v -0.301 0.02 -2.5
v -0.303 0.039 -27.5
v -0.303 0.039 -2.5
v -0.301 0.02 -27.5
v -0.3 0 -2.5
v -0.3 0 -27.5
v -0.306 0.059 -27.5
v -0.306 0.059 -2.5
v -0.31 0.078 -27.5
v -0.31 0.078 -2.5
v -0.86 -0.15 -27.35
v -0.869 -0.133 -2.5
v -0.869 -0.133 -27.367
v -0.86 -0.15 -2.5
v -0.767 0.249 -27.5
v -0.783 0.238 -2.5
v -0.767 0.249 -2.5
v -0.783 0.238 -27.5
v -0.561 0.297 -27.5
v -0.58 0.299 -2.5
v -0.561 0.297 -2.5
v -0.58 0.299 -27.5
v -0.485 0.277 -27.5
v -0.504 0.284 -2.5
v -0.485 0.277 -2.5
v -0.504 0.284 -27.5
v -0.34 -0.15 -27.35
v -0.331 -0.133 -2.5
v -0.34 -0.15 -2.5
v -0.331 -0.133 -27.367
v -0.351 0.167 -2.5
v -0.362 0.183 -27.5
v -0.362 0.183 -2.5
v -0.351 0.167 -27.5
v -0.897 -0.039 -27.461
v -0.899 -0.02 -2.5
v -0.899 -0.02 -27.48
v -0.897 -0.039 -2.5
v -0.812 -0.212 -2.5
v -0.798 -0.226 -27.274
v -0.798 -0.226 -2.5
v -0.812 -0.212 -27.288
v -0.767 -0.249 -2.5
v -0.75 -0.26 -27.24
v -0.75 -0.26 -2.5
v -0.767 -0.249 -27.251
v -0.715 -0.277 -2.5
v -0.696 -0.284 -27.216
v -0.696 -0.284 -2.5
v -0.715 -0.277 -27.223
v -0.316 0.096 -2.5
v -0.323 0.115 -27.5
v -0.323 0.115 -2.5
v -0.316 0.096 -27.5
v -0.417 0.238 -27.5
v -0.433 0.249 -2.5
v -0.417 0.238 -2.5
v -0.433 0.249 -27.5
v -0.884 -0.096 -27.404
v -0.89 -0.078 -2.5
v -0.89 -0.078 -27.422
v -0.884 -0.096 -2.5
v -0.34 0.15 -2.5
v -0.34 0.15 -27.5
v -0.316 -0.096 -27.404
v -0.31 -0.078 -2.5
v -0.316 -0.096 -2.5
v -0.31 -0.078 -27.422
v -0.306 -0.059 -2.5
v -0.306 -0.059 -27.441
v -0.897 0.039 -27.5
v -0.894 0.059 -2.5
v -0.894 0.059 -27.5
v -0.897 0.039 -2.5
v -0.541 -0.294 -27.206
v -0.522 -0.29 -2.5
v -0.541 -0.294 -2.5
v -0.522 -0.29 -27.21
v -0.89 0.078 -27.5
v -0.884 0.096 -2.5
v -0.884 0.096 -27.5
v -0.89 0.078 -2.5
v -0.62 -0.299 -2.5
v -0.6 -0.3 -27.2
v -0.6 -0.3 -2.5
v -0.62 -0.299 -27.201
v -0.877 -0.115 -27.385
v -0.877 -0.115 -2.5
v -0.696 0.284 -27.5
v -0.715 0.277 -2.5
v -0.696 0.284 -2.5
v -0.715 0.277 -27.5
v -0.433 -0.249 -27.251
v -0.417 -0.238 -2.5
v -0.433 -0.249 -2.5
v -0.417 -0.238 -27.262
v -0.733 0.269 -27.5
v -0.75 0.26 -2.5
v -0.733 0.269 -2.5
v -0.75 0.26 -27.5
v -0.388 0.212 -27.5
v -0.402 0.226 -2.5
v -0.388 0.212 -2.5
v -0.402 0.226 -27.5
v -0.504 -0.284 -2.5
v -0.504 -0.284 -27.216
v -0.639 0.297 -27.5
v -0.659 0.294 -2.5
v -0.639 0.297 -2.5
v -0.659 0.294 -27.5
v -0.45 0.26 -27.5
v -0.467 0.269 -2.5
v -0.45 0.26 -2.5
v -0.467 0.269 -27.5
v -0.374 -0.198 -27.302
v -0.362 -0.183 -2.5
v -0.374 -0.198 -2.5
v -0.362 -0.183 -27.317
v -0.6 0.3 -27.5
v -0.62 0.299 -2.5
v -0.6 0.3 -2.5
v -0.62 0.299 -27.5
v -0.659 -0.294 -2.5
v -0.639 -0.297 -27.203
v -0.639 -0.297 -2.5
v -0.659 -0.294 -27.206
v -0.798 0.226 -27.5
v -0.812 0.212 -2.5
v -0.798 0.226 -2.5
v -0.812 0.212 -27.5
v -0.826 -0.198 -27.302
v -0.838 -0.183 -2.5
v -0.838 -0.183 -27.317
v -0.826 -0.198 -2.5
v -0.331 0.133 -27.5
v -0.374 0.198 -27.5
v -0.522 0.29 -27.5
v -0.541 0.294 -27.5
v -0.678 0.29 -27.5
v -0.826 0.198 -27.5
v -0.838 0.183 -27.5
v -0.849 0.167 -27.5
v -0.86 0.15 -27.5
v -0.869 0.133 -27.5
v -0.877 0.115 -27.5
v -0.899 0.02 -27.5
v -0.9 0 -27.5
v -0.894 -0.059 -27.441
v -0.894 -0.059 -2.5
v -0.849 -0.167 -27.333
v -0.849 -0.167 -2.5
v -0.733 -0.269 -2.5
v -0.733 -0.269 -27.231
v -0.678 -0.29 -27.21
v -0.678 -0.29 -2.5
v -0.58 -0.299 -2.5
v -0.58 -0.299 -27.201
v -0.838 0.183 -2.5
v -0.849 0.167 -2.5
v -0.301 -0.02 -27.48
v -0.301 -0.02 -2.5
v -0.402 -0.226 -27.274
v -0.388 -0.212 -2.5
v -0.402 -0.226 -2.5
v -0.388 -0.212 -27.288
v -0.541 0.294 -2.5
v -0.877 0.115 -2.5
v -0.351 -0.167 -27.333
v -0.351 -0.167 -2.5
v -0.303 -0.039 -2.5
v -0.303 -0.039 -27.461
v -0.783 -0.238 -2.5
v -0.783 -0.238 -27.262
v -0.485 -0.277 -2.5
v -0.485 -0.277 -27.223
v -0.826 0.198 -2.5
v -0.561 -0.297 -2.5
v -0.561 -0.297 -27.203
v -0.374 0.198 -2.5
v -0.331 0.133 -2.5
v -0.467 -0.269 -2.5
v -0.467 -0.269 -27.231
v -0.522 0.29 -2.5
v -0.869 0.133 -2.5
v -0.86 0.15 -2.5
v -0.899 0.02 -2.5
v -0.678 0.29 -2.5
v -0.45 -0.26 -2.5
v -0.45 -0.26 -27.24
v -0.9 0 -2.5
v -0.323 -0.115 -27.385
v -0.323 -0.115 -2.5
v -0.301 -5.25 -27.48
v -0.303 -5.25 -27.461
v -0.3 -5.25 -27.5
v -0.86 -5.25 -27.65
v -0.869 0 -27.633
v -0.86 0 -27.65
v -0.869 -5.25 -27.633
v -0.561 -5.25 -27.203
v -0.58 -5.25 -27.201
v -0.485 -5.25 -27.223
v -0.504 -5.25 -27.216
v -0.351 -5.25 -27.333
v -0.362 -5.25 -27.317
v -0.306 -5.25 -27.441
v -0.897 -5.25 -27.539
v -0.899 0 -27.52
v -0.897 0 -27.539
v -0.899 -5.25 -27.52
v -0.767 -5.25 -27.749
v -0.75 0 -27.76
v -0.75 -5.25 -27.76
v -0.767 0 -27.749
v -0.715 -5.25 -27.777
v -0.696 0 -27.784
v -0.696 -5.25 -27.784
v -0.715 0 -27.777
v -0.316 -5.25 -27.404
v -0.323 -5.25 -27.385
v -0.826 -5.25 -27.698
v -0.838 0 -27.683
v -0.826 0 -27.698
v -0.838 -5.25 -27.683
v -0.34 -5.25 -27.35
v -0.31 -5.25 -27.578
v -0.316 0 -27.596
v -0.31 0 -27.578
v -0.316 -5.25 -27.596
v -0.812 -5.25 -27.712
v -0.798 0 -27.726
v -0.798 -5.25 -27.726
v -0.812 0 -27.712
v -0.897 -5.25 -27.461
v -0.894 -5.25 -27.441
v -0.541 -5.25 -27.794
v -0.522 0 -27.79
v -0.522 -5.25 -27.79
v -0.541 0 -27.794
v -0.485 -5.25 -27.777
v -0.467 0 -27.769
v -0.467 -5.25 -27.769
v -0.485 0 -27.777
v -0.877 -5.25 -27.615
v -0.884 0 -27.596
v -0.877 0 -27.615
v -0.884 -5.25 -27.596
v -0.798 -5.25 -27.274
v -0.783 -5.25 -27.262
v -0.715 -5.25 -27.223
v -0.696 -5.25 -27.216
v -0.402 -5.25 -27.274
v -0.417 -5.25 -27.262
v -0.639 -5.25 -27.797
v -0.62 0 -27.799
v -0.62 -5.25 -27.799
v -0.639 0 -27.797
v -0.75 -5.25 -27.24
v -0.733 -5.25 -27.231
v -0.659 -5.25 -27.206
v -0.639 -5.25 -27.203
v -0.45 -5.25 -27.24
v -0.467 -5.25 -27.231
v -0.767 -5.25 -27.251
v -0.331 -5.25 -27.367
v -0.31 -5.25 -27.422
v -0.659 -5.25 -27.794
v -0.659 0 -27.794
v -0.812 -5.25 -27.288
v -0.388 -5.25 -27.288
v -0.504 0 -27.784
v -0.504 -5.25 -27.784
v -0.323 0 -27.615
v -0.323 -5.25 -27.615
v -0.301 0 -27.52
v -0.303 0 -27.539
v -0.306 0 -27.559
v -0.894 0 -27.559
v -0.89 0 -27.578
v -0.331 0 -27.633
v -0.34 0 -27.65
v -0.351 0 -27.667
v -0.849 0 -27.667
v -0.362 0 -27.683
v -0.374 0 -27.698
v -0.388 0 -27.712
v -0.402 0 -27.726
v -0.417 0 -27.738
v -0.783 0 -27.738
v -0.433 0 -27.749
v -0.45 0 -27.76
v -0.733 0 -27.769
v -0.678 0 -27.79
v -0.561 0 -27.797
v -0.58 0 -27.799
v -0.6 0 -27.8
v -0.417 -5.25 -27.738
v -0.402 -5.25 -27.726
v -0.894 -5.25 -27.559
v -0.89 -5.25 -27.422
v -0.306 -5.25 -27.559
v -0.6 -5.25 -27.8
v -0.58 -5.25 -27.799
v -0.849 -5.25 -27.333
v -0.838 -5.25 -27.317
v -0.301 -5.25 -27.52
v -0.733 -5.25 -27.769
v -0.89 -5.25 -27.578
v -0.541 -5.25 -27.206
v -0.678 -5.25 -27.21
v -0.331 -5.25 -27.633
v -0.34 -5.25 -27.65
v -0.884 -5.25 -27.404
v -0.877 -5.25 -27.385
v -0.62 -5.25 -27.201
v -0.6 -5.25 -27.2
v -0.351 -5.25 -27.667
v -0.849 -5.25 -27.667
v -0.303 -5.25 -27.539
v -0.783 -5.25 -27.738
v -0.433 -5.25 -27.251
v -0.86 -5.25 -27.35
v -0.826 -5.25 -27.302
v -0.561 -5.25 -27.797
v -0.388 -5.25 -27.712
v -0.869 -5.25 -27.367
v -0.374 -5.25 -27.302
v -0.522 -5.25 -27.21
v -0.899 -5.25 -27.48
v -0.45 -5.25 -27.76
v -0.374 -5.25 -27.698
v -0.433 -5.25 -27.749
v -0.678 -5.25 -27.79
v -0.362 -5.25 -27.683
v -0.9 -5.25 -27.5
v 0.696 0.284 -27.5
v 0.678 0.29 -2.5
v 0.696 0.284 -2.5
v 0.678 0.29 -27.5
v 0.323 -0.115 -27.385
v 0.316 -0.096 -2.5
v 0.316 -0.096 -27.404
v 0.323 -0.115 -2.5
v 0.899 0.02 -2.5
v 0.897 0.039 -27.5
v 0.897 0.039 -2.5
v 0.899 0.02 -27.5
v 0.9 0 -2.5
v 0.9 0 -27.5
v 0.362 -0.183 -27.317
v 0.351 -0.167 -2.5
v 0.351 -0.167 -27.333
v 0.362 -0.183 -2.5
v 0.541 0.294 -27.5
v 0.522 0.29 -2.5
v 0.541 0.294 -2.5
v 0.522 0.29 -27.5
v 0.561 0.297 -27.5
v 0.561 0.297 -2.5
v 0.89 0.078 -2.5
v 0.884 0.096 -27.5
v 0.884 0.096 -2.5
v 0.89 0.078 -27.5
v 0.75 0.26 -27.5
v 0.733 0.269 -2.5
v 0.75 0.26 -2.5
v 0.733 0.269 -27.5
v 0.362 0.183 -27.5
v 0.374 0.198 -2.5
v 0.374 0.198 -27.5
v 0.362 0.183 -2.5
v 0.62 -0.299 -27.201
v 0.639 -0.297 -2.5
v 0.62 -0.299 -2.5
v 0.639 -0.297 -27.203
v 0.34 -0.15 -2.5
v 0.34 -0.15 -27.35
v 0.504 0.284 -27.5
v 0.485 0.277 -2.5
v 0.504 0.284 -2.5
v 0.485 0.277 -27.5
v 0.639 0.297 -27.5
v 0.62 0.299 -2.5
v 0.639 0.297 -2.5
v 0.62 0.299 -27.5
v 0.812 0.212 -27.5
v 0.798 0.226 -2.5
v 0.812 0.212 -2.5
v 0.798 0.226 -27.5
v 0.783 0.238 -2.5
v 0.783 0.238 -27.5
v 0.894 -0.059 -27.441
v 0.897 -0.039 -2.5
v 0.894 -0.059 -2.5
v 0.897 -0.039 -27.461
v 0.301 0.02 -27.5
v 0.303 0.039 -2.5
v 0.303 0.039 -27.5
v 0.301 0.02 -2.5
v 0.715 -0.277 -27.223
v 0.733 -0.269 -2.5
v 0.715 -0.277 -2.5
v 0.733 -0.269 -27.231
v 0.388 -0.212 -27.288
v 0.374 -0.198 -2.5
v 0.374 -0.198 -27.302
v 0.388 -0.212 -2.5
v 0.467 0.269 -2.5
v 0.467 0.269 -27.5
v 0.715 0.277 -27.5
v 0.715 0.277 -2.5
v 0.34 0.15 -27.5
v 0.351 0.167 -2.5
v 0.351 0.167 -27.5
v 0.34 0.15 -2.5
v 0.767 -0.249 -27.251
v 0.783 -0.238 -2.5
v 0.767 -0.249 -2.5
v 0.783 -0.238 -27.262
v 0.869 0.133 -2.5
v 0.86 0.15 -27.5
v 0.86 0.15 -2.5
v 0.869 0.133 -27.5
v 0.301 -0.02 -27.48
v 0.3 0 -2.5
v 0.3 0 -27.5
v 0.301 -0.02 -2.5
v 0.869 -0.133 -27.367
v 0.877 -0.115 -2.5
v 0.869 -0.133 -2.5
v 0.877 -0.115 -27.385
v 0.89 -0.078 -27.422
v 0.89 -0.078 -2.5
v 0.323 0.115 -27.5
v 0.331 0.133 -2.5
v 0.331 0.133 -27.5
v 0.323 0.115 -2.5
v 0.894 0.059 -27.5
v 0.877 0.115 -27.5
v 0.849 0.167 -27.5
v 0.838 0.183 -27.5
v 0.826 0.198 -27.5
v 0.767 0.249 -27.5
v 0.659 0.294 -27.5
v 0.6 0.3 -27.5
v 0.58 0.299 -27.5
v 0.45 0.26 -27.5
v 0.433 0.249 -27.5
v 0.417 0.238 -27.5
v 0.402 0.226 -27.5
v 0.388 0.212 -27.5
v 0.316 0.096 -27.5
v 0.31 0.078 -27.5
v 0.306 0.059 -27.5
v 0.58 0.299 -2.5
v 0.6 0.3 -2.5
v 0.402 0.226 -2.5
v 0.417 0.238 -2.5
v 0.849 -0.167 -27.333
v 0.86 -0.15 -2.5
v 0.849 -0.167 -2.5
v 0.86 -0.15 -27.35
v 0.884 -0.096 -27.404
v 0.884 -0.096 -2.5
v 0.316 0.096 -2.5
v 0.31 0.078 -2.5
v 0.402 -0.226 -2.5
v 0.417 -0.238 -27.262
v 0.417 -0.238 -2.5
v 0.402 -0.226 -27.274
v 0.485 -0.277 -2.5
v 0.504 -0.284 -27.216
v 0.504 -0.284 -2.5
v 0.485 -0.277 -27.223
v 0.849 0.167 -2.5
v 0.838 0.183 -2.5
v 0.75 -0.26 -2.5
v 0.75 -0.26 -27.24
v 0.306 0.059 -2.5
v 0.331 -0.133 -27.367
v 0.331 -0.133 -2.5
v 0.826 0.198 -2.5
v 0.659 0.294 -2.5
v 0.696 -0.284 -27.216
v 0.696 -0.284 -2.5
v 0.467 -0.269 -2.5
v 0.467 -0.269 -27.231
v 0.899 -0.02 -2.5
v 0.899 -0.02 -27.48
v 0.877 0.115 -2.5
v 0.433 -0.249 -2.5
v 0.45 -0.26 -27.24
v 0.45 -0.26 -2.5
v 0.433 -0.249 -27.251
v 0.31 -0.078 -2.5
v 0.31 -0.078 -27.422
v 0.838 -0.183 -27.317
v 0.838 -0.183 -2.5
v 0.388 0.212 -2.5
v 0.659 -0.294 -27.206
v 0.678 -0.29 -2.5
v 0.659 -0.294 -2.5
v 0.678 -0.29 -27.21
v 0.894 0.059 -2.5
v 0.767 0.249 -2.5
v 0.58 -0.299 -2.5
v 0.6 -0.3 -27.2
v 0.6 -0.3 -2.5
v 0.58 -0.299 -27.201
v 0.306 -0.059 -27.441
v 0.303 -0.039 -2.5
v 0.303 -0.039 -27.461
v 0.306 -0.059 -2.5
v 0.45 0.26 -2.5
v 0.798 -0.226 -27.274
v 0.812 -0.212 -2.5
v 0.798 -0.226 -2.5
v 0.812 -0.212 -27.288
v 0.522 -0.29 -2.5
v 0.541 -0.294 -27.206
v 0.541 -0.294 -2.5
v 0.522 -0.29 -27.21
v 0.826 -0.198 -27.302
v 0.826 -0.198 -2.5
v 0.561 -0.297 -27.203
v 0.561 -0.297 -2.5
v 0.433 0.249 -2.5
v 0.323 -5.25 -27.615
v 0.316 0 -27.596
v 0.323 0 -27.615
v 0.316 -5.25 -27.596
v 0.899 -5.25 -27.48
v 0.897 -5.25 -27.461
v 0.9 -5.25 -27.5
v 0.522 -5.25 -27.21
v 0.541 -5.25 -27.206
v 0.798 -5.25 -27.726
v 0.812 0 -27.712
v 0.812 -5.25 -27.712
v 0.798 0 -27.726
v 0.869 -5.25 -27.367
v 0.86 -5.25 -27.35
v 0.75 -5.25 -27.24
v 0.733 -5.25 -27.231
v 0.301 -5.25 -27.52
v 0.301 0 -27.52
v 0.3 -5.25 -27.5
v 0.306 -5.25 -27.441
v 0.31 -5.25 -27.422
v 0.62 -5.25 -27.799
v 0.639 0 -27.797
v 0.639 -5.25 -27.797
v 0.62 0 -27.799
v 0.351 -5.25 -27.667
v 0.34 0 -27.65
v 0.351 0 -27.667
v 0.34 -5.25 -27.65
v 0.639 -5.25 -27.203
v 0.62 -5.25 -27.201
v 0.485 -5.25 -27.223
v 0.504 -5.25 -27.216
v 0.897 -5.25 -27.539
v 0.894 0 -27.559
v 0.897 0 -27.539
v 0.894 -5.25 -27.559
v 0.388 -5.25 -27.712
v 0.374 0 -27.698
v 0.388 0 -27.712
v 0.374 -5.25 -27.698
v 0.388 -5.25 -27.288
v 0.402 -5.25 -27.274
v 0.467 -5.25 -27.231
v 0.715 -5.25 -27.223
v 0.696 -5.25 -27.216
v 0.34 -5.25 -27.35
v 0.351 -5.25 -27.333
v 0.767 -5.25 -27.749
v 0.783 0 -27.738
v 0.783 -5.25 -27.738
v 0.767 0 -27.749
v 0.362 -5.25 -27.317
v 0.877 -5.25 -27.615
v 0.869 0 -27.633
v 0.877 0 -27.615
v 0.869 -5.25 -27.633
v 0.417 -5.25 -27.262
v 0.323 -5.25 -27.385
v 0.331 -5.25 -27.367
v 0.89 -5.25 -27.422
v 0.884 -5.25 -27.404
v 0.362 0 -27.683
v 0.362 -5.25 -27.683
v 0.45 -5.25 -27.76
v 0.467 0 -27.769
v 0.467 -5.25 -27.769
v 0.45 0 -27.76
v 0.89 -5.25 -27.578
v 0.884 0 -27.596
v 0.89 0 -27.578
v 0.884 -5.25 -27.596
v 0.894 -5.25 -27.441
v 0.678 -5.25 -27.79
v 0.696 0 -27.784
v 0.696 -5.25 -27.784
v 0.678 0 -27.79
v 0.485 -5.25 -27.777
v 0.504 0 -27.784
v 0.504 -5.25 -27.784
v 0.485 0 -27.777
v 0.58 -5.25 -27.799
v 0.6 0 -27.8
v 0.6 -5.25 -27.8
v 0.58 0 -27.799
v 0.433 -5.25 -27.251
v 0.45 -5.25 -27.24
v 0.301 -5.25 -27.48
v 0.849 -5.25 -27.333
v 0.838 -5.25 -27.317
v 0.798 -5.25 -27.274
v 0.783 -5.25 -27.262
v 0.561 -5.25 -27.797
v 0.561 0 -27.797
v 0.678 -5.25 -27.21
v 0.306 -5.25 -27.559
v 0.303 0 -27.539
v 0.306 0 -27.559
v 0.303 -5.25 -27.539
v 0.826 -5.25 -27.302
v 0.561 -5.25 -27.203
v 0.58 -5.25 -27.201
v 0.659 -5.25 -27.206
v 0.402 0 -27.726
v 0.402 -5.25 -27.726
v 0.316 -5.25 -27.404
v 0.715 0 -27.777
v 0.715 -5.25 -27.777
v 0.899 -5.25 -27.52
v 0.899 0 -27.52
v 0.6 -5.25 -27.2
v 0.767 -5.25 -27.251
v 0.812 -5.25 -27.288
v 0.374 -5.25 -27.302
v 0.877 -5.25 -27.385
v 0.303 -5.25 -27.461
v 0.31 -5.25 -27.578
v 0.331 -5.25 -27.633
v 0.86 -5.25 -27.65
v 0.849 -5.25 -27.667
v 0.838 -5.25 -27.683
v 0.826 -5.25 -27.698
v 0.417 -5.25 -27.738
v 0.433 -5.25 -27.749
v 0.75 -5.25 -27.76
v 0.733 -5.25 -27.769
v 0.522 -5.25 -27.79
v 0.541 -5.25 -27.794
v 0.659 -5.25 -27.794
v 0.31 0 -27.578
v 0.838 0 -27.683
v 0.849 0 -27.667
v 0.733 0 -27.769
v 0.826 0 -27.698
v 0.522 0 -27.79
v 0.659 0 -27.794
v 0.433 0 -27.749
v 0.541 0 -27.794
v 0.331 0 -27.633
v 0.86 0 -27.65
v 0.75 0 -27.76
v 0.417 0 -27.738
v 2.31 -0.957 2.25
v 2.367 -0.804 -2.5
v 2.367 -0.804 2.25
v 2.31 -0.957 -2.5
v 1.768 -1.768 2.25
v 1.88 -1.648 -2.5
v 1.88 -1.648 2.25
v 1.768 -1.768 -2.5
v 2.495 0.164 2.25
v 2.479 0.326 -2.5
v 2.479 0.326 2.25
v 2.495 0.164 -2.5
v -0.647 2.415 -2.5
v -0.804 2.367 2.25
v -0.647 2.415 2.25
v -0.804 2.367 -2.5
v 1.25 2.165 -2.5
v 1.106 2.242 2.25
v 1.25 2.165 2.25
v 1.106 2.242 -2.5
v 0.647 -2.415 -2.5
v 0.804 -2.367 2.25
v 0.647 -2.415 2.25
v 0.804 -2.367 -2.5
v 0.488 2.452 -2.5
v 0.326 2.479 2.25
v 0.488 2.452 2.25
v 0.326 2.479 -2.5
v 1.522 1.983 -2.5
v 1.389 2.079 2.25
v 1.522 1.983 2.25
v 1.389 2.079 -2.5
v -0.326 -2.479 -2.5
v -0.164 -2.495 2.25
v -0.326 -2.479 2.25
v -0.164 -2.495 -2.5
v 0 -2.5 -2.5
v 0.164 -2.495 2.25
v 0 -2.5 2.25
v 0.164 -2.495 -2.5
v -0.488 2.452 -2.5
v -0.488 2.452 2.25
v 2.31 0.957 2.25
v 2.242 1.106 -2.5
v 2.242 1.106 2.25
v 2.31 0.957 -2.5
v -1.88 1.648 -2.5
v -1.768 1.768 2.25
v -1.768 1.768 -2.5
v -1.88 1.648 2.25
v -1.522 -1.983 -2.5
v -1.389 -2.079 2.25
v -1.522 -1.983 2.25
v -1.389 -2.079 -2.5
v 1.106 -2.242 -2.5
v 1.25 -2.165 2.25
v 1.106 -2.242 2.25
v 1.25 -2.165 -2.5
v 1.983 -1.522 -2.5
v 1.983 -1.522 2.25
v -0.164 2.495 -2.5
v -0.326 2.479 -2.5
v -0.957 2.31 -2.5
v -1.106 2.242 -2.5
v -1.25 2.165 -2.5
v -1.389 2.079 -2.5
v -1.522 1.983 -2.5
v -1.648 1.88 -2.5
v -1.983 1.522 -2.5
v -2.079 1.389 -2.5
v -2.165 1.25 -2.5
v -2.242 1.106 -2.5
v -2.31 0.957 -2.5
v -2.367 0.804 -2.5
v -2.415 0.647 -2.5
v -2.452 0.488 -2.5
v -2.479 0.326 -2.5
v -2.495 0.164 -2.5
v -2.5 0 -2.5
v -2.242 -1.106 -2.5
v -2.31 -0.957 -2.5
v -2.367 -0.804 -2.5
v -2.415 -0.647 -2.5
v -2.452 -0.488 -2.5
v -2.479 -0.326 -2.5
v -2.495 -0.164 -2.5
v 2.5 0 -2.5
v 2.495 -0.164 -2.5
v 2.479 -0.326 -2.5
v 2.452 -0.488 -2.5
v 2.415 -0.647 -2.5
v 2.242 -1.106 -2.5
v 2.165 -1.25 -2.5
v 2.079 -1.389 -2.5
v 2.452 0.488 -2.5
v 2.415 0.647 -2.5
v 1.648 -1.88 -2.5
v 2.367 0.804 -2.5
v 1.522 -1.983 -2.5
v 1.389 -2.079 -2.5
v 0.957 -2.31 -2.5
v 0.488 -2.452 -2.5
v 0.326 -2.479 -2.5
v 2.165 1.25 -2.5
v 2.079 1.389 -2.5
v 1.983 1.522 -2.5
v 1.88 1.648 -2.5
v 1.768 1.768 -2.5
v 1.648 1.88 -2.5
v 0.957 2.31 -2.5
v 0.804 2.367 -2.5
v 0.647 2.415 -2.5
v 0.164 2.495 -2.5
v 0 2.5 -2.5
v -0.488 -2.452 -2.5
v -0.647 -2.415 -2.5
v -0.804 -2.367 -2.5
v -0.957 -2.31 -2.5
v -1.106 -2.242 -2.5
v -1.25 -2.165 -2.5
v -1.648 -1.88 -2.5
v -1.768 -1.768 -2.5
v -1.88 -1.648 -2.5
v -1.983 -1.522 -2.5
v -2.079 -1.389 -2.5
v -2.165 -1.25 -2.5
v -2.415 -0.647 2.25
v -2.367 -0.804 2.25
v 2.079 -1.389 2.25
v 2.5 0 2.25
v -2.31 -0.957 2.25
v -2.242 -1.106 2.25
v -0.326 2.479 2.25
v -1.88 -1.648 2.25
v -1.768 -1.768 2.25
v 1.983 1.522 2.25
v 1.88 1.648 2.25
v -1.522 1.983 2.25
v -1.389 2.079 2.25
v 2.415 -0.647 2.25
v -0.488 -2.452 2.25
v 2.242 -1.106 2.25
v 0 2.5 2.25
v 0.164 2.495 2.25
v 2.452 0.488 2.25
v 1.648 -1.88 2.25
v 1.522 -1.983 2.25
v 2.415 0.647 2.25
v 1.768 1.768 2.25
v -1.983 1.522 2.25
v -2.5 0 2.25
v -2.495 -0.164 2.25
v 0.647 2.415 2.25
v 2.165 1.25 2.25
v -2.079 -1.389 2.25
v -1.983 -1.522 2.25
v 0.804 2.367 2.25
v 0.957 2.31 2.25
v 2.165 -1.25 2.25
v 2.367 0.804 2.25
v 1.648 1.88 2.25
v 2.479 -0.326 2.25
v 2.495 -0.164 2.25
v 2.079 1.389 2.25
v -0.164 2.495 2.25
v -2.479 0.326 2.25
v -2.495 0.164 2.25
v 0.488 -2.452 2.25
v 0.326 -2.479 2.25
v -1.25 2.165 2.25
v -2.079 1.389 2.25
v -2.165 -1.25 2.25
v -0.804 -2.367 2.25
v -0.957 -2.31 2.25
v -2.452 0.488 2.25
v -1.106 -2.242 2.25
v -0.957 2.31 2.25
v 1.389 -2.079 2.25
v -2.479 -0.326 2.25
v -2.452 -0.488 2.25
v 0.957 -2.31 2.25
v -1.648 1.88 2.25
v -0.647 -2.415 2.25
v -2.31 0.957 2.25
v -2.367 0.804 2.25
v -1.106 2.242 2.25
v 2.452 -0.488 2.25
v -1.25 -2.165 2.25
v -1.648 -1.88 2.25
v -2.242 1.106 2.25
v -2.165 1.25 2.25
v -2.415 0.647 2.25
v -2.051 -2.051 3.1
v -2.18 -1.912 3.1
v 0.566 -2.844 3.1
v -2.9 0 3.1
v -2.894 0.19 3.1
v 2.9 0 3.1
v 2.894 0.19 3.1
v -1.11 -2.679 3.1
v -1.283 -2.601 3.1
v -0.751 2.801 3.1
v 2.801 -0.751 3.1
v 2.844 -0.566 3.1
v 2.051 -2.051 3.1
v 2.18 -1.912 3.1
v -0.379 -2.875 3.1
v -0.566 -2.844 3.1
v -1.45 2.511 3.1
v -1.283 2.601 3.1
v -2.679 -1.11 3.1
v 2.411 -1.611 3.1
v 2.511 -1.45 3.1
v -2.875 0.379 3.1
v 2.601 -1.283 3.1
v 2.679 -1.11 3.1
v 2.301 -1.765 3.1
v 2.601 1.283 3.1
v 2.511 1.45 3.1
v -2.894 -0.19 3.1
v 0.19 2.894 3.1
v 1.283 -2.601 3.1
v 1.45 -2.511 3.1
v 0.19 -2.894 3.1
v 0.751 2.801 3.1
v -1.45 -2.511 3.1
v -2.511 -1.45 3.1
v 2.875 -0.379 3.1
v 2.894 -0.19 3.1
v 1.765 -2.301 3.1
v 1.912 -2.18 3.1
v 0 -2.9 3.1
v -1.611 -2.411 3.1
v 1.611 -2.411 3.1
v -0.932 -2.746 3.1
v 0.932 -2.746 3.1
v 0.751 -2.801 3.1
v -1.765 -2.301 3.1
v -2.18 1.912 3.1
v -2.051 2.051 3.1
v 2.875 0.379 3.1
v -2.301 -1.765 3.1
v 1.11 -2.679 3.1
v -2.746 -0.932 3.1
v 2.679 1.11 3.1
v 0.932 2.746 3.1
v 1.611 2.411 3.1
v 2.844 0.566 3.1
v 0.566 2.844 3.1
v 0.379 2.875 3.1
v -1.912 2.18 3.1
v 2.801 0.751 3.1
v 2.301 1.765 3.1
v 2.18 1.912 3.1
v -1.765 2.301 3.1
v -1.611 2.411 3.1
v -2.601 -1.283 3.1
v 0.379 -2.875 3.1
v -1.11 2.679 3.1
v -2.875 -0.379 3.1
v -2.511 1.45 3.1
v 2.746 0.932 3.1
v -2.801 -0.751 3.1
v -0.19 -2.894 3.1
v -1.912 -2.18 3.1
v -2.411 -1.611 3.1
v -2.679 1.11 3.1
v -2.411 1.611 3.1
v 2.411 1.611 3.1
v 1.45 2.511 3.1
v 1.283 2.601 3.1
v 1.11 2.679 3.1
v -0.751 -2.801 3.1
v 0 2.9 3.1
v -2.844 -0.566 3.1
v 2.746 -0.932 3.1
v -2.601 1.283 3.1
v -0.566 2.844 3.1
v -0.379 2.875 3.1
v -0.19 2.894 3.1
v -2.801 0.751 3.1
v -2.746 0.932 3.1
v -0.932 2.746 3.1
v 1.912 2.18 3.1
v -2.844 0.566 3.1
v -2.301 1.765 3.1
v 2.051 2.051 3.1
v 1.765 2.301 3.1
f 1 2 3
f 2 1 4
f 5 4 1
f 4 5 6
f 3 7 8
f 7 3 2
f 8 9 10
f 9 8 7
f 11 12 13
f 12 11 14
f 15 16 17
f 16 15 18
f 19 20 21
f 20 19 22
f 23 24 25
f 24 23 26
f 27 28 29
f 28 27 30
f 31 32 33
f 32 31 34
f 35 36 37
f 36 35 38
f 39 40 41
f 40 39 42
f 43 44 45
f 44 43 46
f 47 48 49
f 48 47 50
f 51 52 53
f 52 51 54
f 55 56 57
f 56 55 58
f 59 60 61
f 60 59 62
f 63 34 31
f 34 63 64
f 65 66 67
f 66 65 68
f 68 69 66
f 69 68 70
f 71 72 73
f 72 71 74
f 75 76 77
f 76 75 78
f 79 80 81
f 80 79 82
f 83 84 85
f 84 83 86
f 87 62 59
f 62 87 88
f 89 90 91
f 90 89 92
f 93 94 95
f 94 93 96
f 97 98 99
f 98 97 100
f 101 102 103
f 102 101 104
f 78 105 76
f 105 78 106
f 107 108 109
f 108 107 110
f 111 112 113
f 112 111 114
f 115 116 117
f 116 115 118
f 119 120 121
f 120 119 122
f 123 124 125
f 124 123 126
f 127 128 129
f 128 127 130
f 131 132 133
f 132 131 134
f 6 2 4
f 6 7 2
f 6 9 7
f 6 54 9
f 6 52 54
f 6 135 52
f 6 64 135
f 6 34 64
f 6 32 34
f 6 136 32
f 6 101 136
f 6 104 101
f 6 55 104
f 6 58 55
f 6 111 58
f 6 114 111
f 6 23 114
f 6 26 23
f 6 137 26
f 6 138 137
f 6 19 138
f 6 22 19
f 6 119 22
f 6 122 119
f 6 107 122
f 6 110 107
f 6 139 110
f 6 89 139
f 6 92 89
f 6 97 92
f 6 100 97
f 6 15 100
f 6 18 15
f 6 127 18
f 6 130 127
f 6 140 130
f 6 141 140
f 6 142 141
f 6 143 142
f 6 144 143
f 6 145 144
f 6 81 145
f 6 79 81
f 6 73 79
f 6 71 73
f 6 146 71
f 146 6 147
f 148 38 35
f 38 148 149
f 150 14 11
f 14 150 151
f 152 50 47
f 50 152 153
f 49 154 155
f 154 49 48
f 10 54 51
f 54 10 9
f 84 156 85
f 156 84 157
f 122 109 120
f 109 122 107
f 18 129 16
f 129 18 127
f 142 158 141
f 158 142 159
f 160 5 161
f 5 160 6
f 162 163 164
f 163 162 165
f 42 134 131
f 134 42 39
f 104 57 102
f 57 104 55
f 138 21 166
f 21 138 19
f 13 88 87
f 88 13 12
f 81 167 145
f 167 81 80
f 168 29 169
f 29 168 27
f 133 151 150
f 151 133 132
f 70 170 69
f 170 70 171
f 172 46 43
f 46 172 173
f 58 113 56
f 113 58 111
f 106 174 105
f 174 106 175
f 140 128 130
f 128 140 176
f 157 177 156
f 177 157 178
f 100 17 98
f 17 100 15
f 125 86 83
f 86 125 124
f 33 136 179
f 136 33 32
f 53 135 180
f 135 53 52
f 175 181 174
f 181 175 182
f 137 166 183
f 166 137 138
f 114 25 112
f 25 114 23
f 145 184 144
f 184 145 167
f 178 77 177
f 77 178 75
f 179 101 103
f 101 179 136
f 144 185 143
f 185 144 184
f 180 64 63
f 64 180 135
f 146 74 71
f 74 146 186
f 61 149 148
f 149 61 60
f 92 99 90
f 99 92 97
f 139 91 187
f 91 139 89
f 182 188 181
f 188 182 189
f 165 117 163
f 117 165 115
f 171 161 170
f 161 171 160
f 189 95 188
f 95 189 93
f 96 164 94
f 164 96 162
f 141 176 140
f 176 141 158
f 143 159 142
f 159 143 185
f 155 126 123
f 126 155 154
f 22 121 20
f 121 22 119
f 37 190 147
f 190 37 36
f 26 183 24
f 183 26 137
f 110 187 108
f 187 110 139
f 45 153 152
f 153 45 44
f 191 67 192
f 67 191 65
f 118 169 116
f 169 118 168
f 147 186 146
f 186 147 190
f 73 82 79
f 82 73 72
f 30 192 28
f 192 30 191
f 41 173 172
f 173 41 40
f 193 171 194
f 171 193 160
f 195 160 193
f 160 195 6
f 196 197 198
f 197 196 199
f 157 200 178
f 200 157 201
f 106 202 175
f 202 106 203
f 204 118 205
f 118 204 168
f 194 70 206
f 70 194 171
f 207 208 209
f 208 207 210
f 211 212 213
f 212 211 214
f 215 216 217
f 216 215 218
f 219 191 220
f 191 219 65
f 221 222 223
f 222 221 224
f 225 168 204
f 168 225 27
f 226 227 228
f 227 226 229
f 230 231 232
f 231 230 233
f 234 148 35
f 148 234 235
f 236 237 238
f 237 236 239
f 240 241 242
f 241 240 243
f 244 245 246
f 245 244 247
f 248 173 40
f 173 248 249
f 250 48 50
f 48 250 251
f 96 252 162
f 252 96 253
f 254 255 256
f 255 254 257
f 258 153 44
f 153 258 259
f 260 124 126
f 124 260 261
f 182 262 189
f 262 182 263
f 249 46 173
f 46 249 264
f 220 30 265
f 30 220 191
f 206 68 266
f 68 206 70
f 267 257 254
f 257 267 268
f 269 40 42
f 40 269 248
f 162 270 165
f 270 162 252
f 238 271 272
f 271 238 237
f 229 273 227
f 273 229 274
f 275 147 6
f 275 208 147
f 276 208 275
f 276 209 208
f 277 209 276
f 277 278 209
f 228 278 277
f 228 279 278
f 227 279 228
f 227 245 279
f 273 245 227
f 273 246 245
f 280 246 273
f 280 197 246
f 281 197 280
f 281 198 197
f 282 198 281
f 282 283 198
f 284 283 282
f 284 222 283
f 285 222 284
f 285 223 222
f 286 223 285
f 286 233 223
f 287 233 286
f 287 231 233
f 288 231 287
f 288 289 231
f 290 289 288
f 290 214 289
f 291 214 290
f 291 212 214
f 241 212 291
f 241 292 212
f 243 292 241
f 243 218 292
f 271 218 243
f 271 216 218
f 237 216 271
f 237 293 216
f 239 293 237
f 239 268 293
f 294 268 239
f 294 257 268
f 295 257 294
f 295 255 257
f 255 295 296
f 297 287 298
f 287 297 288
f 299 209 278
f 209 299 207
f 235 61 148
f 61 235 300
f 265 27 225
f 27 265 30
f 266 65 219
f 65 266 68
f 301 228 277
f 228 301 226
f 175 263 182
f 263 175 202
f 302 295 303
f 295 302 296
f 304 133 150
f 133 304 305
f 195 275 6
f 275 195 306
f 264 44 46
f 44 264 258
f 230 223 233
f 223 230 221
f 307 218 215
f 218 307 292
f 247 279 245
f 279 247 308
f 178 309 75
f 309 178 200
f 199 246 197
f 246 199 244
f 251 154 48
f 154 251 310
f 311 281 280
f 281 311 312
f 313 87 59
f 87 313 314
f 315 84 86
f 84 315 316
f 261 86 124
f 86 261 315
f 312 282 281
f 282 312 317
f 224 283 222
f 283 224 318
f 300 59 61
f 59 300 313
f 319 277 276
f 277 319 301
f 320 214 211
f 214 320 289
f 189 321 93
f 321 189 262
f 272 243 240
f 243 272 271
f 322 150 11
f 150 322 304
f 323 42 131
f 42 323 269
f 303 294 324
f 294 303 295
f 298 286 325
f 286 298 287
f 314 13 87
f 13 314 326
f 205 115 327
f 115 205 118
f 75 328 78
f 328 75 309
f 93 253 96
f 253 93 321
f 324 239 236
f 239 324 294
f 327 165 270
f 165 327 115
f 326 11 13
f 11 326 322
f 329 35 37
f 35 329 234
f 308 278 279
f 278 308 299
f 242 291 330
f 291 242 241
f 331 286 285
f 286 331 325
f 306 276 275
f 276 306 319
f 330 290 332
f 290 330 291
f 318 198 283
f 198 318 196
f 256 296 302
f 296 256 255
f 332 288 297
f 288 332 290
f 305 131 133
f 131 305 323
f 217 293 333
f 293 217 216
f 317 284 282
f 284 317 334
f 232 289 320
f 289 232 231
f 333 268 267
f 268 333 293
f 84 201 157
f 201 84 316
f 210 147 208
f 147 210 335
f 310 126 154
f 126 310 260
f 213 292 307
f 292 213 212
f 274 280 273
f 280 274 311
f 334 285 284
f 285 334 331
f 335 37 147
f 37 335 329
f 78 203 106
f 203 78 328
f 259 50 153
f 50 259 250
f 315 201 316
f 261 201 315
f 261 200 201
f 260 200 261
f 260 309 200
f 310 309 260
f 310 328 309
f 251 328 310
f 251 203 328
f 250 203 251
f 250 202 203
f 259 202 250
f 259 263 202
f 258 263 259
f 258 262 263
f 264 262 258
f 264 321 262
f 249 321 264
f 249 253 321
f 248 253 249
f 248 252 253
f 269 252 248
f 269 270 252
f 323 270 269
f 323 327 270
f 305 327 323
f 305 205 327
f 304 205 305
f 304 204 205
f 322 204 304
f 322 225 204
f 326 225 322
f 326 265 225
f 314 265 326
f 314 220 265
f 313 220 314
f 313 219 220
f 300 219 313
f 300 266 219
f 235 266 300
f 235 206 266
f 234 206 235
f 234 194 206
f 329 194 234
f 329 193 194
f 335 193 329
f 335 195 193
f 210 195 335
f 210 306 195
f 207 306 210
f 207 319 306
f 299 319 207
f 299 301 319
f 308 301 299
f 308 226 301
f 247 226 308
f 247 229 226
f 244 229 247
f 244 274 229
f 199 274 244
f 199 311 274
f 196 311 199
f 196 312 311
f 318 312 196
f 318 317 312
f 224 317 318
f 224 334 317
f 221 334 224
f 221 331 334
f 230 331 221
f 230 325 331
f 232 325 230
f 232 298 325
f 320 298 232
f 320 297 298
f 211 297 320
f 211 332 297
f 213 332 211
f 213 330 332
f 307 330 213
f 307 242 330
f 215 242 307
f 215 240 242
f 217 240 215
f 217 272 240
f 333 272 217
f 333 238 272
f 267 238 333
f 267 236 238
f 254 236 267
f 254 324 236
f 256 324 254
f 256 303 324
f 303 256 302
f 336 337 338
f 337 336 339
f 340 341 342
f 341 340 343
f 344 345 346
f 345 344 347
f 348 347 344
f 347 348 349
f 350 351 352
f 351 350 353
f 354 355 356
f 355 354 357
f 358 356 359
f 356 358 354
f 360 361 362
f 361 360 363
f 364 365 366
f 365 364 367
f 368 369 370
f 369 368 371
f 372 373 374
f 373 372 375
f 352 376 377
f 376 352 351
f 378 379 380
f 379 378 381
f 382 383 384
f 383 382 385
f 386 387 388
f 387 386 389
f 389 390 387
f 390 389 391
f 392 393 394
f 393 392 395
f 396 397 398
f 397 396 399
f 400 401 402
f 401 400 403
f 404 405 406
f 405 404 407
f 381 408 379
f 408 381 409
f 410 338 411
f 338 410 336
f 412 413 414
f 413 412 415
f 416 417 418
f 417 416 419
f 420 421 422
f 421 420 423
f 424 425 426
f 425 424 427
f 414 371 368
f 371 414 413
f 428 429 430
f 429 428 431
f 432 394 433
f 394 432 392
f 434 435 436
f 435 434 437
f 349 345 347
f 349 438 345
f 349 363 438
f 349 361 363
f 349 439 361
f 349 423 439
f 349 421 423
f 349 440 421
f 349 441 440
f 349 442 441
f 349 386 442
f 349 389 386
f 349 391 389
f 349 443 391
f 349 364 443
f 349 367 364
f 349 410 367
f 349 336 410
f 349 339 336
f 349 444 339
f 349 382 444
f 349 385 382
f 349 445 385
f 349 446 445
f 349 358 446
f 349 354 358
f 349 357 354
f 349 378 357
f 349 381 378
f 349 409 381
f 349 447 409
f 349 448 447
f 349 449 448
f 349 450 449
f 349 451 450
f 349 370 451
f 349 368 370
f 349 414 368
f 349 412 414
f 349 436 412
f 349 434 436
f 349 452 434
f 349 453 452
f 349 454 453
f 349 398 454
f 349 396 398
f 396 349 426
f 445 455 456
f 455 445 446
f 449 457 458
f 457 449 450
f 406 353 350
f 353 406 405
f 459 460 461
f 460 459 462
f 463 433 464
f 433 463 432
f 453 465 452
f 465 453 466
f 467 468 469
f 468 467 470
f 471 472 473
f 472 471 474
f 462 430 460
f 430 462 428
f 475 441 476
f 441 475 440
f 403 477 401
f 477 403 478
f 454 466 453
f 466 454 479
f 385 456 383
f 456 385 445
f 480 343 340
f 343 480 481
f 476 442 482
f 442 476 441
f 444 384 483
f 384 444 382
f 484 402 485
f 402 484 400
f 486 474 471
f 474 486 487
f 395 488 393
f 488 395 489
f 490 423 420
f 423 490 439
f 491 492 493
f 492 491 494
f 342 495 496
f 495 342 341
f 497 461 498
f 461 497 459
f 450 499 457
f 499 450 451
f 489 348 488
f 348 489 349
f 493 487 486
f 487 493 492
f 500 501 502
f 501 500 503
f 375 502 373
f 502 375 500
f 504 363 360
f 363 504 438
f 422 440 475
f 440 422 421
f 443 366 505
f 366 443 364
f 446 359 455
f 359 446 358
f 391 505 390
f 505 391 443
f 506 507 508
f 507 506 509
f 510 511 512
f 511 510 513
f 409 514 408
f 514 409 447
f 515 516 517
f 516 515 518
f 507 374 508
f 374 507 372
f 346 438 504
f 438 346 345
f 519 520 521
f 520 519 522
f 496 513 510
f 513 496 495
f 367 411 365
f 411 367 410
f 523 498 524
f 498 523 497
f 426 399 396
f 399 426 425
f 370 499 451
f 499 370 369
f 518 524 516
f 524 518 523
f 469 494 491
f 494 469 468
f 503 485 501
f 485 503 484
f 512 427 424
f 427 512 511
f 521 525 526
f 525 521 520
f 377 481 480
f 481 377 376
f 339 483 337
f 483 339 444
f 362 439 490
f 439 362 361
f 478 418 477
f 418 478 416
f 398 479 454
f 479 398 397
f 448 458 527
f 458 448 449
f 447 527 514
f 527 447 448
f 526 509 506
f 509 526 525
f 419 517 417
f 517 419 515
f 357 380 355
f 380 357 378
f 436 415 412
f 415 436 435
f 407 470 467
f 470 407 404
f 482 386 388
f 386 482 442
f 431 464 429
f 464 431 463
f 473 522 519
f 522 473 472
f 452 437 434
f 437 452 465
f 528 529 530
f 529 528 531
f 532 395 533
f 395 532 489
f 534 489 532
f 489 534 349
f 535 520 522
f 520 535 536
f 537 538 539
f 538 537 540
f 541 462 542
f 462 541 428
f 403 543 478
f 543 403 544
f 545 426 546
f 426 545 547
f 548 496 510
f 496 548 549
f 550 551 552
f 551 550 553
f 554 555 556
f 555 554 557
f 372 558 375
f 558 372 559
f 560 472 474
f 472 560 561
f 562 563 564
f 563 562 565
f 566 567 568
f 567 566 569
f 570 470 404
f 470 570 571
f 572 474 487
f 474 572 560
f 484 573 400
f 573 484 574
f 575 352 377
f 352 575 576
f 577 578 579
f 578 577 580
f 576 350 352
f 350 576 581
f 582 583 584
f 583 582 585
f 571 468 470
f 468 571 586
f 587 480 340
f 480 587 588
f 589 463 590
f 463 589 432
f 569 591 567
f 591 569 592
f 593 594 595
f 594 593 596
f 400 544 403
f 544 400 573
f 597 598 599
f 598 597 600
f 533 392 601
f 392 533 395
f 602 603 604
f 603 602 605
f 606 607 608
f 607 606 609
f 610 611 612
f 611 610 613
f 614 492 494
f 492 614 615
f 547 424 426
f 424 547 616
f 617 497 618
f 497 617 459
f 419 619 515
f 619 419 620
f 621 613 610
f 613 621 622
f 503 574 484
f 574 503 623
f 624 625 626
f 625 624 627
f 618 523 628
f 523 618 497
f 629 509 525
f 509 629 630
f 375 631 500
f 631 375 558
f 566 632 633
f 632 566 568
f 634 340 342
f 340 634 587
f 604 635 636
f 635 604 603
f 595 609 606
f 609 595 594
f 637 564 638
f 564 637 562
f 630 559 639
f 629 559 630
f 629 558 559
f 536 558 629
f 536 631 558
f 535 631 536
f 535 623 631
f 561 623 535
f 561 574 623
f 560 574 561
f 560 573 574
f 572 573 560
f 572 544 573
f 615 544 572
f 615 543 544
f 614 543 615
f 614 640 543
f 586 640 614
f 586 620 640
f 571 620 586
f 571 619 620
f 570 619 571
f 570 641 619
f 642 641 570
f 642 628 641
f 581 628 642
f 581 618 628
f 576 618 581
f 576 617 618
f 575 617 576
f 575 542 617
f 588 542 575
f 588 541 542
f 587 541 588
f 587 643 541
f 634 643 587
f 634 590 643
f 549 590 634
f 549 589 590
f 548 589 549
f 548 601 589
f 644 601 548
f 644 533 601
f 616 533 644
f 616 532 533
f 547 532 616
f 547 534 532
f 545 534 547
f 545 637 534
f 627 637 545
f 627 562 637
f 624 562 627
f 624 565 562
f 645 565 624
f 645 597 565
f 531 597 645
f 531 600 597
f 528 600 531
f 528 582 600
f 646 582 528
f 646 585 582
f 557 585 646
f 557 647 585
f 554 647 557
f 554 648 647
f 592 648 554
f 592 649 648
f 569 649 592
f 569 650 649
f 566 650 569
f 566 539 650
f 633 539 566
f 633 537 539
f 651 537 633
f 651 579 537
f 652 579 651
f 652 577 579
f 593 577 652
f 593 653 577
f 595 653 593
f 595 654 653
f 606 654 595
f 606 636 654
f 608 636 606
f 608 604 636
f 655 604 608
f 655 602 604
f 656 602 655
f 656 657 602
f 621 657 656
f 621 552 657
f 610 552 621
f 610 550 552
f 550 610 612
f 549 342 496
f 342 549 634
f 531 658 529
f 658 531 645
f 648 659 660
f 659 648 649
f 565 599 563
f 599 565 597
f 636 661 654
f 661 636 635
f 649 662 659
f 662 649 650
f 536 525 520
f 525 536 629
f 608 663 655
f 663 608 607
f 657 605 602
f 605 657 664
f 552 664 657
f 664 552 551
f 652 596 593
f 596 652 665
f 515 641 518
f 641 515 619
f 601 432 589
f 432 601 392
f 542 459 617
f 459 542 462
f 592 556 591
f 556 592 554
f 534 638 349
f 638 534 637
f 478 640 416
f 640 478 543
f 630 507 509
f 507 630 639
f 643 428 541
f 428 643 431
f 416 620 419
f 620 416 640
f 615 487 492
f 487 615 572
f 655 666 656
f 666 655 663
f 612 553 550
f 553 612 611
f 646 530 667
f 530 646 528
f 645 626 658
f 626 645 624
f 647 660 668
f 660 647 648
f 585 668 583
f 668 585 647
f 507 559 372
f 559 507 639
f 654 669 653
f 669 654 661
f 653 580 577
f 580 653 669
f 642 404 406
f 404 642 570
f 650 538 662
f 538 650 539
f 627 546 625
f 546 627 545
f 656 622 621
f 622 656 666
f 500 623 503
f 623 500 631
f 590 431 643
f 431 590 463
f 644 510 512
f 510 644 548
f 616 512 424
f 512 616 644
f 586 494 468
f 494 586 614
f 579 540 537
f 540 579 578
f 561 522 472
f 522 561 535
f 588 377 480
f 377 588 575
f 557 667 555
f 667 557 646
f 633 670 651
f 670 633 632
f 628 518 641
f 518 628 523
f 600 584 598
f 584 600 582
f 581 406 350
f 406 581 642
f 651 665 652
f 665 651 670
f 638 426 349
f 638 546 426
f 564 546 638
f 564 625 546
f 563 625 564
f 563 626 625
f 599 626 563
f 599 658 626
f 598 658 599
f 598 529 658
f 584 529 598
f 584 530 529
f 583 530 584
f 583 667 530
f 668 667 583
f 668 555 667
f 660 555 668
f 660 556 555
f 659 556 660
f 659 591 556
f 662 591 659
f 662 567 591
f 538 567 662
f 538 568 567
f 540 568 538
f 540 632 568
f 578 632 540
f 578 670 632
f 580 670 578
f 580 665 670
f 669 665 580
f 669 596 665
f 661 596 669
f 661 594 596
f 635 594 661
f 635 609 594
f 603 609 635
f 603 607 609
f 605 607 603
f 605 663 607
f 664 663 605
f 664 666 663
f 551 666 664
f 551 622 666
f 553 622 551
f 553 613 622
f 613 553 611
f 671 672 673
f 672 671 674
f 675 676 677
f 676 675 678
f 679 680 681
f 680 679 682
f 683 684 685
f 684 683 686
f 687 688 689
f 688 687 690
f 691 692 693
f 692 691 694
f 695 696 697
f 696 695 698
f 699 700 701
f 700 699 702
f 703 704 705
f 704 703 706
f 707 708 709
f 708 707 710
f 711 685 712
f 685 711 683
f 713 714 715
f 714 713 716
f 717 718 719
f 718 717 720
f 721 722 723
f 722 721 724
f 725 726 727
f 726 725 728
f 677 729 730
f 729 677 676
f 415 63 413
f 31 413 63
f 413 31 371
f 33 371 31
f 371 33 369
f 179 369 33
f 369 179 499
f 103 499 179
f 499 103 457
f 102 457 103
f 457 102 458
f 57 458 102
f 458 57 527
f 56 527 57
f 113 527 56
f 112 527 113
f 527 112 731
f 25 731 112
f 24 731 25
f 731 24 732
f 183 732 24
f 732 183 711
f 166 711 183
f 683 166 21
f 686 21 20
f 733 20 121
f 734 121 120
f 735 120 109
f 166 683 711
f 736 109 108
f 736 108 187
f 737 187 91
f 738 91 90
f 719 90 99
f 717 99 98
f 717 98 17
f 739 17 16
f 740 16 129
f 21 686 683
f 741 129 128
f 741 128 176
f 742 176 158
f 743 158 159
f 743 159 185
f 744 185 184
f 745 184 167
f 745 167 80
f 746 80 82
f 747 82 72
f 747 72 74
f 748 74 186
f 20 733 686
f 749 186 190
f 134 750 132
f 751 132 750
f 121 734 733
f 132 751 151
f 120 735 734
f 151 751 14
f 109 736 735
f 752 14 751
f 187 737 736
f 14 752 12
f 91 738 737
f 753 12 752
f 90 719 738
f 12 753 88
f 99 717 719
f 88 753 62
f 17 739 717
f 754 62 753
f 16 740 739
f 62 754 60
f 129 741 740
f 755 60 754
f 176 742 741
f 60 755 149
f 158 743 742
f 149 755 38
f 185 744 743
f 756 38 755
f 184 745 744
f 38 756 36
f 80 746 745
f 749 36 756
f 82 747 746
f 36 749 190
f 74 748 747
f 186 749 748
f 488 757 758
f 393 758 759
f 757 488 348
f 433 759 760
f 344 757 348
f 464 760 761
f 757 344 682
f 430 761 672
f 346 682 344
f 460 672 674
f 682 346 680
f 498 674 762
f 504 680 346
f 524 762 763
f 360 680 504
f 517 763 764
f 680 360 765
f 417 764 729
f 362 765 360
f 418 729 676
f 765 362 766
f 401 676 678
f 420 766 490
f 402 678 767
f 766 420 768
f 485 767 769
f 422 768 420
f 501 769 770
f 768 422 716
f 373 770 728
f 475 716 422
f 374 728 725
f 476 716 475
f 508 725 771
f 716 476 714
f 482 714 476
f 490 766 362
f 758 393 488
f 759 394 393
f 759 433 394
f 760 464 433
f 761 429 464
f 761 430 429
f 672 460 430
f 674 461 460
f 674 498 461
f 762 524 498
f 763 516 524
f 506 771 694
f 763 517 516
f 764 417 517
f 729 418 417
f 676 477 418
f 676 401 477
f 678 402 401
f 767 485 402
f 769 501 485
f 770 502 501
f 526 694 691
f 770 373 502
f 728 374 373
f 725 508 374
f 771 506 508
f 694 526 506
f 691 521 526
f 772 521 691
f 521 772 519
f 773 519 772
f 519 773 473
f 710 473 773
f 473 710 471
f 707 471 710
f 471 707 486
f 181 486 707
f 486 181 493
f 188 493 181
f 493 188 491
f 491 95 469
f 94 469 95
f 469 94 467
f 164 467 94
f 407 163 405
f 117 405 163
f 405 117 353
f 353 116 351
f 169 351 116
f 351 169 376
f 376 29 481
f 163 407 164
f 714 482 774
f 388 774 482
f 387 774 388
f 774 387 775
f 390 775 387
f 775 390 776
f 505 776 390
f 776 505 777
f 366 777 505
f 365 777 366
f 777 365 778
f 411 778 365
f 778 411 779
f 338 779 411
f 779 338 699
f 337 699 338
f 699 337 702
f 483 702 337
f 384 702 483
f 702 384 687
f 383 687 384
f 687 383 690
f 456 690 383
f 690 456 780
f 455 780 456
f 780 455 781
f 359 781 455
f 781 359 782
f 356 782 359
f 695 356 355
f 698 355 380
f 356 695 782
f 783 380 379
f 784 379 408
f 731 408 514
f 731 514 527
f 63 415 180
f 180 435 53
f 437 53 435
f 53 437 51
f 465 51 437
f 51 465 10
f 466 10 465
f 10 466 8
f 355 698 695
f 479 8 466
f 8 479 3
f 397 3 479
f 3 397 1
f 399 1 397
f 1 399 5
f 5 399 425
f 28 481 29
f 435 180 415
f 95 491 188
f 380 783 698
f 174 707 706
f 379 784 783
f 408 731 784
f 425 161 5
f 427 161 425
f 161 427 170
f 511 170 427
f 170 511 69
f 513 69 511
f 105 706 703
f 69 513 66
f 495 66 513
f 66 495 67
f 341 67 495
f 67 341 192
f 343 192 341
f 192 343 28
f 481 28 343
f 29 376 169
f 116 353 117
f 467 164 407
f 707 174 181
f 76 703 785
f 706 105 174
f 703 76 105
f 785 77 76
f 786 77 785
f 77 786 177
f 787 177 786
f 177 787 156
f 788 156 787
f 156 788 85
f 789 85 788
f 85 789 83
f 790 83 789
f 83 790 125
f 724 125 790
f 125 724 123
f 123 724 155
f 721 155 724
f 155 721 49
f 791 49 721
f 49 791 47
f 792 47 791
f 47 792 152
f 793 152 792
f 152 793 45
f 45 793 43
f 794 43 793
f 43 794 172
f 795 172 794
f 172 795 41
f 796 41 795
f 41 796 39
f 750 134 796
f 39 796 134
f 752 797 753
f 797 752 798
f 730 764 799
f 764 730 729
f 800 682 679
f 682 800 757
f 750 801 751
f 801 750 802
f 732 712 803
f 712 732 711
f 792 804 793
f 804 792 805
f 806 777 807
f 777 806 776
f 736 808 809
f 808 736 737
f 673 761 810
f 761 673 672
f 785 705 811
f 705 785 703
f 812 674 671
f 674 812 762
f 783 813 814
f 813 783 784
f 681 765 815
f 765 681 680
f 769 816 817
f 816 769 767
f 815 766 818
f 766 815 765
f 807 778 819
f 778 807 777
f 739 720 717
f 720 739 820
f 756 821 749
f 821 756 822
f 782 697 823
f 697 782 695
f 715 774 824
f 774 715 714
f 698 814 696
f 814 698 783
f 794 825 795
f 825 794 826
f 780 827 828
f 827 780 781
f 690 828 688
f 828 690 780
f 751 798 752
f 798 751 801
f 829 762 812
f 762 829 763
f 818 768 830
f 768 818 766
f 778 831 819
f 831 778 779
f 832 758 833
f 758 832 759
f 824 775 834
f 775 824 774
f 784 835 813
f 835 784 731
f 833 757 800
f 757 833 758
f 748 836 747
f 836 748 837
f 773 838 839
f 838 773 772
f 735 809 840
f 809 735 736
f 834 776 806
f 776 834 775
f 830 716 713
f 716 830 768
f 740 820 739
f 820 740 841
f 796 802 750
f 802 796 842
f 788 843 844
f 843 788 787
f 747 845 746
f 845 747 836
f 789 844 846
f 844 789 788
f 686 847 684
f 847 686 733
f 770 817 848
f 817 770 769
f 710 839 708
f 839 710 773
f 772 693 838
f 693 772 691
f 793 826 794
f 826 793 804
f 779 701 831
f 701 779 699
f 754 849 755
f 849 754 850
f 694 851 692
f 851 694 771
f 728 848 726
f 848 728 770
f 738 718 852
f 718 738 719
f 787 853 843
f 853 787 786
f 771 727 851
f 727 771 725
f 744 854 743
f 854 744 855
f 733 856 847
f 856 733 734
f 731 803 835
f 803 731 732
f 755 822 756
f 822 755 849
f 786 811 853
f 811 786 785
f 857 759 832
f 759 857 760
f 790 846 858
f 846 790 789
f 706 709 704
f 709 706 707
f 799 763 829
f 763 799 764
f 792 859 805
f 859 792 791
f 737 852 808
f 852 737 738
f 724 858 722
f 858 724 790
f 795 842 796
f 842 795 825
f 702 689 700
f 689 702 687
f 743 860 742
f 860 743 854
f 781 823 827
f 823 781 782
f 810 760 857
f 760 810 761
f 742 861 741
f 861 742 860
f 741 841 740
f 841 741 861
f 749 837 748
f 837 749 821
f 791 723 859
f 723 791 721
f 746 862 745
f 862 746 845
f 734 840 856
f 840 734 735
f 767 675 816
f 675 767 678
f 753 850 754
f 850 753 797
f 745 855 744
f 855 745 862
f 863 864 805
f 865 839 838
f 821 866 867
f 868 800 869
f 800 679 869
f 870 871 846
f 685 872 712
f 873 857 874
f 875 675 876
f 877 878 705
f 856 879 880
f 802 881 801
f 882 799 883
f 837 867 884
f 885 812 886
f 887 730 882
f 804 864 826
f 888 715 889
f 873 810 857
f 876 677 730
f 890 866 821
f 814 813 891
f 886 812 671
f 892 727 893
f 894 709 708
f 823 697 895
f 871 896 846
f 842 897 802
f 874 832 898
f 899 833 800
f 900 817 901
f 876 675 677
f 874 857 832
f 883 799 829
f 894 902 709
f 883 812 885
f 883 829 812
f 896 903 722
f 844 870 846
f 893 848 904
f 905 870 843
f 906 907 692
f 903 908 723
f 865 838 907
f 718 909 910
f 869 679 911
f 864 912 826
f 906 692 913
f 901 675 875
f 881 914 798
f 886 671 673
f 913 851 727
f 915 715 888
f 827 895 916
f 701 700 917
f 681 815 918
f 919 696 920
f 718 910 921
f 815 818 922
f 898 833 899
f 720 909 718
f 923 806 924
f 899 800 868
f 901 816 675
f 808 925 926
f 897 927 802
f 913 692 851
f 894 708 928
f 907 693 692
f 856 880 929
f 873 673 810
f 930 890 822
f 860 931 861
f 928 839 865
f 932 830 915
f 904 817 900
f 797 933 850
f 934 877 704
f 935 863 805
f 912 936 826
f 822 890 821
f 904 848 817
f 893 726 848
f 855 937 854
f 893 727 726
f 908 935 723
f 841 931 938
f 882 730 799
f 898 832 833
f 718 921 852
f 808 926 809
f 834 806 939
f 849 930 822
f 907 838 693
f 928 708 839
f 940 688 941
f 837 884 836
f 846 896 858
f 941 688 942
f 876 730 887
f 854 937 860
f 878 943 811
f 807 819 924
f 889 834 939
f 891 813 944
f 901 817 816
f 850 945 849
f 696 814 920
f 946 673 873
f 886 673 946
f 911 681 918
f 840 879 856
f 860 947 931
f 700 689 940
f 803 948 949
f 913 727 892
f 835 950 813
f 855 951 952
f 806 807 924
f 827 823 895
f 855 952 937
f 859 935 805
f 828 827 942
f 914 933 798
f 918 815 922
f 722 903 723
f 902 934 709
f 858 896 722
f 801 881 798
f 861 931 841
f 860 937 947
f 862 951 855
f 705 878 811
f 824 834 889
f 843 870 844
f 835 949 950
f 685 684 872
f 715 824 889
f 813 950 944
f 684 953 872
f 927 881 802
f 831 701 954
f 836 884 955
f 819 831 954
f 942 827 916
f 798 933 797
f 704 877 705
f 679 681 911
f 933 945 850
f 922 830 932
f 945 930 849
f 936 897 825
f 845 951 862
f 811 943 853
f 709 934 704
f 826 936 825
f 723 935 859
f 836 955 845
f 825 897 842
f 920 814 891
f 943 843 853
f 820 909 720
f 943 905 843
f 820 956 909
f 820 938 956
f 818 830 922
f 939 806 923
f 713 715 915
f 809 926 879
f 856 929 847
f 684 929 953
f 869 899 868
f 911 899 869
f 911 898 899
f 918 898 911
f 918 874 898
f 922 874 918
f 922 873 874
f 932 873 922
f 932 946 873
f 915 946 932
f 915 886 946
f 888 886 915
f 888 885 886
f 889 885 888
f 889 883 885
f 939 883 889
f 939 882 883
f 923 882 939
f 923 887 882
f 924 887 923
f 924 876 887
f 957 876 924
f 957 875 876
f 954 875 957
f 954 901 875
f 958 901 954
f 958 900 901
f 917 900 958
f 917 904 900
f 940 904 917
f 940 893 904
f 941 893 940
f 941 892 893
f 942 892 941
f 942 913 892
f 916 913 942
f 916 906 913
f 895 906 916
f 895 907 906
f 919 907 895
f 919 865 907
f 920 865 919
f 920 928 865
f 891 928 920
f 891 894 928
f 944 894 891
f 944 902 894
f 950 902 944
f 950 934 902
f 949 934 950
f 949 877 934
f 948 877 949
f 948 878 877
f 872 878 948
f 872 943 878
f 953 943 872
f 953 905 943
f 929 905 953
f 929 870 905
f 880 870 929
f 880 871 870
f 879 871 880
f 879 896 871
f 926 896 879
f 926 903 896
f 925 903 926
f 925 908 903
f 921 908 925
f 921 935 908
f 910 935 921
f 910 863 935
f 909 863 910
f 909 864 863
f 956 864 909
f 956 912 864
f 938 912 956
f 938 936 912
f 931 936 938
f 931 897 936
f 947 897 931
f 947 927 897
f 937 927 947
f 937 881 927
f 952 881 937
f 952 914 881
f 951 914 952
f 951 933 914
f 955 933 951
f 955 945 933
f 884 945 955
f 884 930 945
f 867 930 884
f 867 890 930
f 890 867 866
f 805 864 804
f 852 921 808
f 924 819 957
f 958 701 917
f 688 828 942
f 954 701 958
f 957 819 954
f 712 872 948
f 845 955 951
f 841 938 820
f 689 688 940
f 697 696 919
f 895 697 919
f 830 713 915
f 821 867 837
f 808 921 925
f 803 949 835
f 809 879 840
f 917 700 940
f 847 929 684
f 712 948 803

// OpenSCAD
$fn = 96;

module led(type="5mm", body_color="green", lead_length=25, bend=true) {

    // --- Dimensions ---
    body_d = (type=="5mm") ? 5 : 3;
    body_h = (type=="5mm") ? 5 : 3;

    rim_h  = 0.6;
    rim_d1 = body_d;
    rim_d2 = body_d + 0.8;

    lead_d = 0.6;
    lead_spacing = (type=="5mm") ? 1.2 : 0.9;

    // Overlap to guarantee ONE connected solid
    overlap = 0.25;

    // Z references (body centered at z=0)
    body_zmin = -body_h/2;
    body_zmax =  body_h/2;

    // Leads start slightly inside body to ensure connection
    lead_z_top = body_zmin + overlap;

    // Bend parameters (right-angle bend at the bottom of the leads)
    bend_len = 5;

    union() {
        // LED body
        color(body_color)
            cylinder(h=body_h, d=body_d, center=true);

        // Rim at top, connected to body (slight overlap into body)
        translate([0, 0, body_zmax - overlap])
            cylinder(h=rim_h + overlap, d1=rim_d1, d2=rim_d2, center=false);

        // Leads (two pins), connected into body
        for (x = [-lead_spacing/2, lead_spacing/2]) {

            // Vertical lead: top at lead_z_top, extends downward
            translate([x, 0, lead_z_top - (lead_length + overlap)])
                cylinder(h=lead_length + overlap, d=lead_d, center=false);

            // Optional right-angle bend at the bottom, connected to lead end
            if (bend) {
                // Bottom of vertical lead is at z = lead_z_top - (lead_length + overlap)
                // Place horizontal cylinder so its start overlaps the vertical lead end.
                translate([x, 0, lead_z_top - (lead_length + overlap)])
                    rotate([90, 0, 0])
                        cylinder(h=bend_len + overlap, d=lead_d, center=false);
            }
        }
    }
}

led(type="5mm", body_color="green", lead_length=25, bend=true);
